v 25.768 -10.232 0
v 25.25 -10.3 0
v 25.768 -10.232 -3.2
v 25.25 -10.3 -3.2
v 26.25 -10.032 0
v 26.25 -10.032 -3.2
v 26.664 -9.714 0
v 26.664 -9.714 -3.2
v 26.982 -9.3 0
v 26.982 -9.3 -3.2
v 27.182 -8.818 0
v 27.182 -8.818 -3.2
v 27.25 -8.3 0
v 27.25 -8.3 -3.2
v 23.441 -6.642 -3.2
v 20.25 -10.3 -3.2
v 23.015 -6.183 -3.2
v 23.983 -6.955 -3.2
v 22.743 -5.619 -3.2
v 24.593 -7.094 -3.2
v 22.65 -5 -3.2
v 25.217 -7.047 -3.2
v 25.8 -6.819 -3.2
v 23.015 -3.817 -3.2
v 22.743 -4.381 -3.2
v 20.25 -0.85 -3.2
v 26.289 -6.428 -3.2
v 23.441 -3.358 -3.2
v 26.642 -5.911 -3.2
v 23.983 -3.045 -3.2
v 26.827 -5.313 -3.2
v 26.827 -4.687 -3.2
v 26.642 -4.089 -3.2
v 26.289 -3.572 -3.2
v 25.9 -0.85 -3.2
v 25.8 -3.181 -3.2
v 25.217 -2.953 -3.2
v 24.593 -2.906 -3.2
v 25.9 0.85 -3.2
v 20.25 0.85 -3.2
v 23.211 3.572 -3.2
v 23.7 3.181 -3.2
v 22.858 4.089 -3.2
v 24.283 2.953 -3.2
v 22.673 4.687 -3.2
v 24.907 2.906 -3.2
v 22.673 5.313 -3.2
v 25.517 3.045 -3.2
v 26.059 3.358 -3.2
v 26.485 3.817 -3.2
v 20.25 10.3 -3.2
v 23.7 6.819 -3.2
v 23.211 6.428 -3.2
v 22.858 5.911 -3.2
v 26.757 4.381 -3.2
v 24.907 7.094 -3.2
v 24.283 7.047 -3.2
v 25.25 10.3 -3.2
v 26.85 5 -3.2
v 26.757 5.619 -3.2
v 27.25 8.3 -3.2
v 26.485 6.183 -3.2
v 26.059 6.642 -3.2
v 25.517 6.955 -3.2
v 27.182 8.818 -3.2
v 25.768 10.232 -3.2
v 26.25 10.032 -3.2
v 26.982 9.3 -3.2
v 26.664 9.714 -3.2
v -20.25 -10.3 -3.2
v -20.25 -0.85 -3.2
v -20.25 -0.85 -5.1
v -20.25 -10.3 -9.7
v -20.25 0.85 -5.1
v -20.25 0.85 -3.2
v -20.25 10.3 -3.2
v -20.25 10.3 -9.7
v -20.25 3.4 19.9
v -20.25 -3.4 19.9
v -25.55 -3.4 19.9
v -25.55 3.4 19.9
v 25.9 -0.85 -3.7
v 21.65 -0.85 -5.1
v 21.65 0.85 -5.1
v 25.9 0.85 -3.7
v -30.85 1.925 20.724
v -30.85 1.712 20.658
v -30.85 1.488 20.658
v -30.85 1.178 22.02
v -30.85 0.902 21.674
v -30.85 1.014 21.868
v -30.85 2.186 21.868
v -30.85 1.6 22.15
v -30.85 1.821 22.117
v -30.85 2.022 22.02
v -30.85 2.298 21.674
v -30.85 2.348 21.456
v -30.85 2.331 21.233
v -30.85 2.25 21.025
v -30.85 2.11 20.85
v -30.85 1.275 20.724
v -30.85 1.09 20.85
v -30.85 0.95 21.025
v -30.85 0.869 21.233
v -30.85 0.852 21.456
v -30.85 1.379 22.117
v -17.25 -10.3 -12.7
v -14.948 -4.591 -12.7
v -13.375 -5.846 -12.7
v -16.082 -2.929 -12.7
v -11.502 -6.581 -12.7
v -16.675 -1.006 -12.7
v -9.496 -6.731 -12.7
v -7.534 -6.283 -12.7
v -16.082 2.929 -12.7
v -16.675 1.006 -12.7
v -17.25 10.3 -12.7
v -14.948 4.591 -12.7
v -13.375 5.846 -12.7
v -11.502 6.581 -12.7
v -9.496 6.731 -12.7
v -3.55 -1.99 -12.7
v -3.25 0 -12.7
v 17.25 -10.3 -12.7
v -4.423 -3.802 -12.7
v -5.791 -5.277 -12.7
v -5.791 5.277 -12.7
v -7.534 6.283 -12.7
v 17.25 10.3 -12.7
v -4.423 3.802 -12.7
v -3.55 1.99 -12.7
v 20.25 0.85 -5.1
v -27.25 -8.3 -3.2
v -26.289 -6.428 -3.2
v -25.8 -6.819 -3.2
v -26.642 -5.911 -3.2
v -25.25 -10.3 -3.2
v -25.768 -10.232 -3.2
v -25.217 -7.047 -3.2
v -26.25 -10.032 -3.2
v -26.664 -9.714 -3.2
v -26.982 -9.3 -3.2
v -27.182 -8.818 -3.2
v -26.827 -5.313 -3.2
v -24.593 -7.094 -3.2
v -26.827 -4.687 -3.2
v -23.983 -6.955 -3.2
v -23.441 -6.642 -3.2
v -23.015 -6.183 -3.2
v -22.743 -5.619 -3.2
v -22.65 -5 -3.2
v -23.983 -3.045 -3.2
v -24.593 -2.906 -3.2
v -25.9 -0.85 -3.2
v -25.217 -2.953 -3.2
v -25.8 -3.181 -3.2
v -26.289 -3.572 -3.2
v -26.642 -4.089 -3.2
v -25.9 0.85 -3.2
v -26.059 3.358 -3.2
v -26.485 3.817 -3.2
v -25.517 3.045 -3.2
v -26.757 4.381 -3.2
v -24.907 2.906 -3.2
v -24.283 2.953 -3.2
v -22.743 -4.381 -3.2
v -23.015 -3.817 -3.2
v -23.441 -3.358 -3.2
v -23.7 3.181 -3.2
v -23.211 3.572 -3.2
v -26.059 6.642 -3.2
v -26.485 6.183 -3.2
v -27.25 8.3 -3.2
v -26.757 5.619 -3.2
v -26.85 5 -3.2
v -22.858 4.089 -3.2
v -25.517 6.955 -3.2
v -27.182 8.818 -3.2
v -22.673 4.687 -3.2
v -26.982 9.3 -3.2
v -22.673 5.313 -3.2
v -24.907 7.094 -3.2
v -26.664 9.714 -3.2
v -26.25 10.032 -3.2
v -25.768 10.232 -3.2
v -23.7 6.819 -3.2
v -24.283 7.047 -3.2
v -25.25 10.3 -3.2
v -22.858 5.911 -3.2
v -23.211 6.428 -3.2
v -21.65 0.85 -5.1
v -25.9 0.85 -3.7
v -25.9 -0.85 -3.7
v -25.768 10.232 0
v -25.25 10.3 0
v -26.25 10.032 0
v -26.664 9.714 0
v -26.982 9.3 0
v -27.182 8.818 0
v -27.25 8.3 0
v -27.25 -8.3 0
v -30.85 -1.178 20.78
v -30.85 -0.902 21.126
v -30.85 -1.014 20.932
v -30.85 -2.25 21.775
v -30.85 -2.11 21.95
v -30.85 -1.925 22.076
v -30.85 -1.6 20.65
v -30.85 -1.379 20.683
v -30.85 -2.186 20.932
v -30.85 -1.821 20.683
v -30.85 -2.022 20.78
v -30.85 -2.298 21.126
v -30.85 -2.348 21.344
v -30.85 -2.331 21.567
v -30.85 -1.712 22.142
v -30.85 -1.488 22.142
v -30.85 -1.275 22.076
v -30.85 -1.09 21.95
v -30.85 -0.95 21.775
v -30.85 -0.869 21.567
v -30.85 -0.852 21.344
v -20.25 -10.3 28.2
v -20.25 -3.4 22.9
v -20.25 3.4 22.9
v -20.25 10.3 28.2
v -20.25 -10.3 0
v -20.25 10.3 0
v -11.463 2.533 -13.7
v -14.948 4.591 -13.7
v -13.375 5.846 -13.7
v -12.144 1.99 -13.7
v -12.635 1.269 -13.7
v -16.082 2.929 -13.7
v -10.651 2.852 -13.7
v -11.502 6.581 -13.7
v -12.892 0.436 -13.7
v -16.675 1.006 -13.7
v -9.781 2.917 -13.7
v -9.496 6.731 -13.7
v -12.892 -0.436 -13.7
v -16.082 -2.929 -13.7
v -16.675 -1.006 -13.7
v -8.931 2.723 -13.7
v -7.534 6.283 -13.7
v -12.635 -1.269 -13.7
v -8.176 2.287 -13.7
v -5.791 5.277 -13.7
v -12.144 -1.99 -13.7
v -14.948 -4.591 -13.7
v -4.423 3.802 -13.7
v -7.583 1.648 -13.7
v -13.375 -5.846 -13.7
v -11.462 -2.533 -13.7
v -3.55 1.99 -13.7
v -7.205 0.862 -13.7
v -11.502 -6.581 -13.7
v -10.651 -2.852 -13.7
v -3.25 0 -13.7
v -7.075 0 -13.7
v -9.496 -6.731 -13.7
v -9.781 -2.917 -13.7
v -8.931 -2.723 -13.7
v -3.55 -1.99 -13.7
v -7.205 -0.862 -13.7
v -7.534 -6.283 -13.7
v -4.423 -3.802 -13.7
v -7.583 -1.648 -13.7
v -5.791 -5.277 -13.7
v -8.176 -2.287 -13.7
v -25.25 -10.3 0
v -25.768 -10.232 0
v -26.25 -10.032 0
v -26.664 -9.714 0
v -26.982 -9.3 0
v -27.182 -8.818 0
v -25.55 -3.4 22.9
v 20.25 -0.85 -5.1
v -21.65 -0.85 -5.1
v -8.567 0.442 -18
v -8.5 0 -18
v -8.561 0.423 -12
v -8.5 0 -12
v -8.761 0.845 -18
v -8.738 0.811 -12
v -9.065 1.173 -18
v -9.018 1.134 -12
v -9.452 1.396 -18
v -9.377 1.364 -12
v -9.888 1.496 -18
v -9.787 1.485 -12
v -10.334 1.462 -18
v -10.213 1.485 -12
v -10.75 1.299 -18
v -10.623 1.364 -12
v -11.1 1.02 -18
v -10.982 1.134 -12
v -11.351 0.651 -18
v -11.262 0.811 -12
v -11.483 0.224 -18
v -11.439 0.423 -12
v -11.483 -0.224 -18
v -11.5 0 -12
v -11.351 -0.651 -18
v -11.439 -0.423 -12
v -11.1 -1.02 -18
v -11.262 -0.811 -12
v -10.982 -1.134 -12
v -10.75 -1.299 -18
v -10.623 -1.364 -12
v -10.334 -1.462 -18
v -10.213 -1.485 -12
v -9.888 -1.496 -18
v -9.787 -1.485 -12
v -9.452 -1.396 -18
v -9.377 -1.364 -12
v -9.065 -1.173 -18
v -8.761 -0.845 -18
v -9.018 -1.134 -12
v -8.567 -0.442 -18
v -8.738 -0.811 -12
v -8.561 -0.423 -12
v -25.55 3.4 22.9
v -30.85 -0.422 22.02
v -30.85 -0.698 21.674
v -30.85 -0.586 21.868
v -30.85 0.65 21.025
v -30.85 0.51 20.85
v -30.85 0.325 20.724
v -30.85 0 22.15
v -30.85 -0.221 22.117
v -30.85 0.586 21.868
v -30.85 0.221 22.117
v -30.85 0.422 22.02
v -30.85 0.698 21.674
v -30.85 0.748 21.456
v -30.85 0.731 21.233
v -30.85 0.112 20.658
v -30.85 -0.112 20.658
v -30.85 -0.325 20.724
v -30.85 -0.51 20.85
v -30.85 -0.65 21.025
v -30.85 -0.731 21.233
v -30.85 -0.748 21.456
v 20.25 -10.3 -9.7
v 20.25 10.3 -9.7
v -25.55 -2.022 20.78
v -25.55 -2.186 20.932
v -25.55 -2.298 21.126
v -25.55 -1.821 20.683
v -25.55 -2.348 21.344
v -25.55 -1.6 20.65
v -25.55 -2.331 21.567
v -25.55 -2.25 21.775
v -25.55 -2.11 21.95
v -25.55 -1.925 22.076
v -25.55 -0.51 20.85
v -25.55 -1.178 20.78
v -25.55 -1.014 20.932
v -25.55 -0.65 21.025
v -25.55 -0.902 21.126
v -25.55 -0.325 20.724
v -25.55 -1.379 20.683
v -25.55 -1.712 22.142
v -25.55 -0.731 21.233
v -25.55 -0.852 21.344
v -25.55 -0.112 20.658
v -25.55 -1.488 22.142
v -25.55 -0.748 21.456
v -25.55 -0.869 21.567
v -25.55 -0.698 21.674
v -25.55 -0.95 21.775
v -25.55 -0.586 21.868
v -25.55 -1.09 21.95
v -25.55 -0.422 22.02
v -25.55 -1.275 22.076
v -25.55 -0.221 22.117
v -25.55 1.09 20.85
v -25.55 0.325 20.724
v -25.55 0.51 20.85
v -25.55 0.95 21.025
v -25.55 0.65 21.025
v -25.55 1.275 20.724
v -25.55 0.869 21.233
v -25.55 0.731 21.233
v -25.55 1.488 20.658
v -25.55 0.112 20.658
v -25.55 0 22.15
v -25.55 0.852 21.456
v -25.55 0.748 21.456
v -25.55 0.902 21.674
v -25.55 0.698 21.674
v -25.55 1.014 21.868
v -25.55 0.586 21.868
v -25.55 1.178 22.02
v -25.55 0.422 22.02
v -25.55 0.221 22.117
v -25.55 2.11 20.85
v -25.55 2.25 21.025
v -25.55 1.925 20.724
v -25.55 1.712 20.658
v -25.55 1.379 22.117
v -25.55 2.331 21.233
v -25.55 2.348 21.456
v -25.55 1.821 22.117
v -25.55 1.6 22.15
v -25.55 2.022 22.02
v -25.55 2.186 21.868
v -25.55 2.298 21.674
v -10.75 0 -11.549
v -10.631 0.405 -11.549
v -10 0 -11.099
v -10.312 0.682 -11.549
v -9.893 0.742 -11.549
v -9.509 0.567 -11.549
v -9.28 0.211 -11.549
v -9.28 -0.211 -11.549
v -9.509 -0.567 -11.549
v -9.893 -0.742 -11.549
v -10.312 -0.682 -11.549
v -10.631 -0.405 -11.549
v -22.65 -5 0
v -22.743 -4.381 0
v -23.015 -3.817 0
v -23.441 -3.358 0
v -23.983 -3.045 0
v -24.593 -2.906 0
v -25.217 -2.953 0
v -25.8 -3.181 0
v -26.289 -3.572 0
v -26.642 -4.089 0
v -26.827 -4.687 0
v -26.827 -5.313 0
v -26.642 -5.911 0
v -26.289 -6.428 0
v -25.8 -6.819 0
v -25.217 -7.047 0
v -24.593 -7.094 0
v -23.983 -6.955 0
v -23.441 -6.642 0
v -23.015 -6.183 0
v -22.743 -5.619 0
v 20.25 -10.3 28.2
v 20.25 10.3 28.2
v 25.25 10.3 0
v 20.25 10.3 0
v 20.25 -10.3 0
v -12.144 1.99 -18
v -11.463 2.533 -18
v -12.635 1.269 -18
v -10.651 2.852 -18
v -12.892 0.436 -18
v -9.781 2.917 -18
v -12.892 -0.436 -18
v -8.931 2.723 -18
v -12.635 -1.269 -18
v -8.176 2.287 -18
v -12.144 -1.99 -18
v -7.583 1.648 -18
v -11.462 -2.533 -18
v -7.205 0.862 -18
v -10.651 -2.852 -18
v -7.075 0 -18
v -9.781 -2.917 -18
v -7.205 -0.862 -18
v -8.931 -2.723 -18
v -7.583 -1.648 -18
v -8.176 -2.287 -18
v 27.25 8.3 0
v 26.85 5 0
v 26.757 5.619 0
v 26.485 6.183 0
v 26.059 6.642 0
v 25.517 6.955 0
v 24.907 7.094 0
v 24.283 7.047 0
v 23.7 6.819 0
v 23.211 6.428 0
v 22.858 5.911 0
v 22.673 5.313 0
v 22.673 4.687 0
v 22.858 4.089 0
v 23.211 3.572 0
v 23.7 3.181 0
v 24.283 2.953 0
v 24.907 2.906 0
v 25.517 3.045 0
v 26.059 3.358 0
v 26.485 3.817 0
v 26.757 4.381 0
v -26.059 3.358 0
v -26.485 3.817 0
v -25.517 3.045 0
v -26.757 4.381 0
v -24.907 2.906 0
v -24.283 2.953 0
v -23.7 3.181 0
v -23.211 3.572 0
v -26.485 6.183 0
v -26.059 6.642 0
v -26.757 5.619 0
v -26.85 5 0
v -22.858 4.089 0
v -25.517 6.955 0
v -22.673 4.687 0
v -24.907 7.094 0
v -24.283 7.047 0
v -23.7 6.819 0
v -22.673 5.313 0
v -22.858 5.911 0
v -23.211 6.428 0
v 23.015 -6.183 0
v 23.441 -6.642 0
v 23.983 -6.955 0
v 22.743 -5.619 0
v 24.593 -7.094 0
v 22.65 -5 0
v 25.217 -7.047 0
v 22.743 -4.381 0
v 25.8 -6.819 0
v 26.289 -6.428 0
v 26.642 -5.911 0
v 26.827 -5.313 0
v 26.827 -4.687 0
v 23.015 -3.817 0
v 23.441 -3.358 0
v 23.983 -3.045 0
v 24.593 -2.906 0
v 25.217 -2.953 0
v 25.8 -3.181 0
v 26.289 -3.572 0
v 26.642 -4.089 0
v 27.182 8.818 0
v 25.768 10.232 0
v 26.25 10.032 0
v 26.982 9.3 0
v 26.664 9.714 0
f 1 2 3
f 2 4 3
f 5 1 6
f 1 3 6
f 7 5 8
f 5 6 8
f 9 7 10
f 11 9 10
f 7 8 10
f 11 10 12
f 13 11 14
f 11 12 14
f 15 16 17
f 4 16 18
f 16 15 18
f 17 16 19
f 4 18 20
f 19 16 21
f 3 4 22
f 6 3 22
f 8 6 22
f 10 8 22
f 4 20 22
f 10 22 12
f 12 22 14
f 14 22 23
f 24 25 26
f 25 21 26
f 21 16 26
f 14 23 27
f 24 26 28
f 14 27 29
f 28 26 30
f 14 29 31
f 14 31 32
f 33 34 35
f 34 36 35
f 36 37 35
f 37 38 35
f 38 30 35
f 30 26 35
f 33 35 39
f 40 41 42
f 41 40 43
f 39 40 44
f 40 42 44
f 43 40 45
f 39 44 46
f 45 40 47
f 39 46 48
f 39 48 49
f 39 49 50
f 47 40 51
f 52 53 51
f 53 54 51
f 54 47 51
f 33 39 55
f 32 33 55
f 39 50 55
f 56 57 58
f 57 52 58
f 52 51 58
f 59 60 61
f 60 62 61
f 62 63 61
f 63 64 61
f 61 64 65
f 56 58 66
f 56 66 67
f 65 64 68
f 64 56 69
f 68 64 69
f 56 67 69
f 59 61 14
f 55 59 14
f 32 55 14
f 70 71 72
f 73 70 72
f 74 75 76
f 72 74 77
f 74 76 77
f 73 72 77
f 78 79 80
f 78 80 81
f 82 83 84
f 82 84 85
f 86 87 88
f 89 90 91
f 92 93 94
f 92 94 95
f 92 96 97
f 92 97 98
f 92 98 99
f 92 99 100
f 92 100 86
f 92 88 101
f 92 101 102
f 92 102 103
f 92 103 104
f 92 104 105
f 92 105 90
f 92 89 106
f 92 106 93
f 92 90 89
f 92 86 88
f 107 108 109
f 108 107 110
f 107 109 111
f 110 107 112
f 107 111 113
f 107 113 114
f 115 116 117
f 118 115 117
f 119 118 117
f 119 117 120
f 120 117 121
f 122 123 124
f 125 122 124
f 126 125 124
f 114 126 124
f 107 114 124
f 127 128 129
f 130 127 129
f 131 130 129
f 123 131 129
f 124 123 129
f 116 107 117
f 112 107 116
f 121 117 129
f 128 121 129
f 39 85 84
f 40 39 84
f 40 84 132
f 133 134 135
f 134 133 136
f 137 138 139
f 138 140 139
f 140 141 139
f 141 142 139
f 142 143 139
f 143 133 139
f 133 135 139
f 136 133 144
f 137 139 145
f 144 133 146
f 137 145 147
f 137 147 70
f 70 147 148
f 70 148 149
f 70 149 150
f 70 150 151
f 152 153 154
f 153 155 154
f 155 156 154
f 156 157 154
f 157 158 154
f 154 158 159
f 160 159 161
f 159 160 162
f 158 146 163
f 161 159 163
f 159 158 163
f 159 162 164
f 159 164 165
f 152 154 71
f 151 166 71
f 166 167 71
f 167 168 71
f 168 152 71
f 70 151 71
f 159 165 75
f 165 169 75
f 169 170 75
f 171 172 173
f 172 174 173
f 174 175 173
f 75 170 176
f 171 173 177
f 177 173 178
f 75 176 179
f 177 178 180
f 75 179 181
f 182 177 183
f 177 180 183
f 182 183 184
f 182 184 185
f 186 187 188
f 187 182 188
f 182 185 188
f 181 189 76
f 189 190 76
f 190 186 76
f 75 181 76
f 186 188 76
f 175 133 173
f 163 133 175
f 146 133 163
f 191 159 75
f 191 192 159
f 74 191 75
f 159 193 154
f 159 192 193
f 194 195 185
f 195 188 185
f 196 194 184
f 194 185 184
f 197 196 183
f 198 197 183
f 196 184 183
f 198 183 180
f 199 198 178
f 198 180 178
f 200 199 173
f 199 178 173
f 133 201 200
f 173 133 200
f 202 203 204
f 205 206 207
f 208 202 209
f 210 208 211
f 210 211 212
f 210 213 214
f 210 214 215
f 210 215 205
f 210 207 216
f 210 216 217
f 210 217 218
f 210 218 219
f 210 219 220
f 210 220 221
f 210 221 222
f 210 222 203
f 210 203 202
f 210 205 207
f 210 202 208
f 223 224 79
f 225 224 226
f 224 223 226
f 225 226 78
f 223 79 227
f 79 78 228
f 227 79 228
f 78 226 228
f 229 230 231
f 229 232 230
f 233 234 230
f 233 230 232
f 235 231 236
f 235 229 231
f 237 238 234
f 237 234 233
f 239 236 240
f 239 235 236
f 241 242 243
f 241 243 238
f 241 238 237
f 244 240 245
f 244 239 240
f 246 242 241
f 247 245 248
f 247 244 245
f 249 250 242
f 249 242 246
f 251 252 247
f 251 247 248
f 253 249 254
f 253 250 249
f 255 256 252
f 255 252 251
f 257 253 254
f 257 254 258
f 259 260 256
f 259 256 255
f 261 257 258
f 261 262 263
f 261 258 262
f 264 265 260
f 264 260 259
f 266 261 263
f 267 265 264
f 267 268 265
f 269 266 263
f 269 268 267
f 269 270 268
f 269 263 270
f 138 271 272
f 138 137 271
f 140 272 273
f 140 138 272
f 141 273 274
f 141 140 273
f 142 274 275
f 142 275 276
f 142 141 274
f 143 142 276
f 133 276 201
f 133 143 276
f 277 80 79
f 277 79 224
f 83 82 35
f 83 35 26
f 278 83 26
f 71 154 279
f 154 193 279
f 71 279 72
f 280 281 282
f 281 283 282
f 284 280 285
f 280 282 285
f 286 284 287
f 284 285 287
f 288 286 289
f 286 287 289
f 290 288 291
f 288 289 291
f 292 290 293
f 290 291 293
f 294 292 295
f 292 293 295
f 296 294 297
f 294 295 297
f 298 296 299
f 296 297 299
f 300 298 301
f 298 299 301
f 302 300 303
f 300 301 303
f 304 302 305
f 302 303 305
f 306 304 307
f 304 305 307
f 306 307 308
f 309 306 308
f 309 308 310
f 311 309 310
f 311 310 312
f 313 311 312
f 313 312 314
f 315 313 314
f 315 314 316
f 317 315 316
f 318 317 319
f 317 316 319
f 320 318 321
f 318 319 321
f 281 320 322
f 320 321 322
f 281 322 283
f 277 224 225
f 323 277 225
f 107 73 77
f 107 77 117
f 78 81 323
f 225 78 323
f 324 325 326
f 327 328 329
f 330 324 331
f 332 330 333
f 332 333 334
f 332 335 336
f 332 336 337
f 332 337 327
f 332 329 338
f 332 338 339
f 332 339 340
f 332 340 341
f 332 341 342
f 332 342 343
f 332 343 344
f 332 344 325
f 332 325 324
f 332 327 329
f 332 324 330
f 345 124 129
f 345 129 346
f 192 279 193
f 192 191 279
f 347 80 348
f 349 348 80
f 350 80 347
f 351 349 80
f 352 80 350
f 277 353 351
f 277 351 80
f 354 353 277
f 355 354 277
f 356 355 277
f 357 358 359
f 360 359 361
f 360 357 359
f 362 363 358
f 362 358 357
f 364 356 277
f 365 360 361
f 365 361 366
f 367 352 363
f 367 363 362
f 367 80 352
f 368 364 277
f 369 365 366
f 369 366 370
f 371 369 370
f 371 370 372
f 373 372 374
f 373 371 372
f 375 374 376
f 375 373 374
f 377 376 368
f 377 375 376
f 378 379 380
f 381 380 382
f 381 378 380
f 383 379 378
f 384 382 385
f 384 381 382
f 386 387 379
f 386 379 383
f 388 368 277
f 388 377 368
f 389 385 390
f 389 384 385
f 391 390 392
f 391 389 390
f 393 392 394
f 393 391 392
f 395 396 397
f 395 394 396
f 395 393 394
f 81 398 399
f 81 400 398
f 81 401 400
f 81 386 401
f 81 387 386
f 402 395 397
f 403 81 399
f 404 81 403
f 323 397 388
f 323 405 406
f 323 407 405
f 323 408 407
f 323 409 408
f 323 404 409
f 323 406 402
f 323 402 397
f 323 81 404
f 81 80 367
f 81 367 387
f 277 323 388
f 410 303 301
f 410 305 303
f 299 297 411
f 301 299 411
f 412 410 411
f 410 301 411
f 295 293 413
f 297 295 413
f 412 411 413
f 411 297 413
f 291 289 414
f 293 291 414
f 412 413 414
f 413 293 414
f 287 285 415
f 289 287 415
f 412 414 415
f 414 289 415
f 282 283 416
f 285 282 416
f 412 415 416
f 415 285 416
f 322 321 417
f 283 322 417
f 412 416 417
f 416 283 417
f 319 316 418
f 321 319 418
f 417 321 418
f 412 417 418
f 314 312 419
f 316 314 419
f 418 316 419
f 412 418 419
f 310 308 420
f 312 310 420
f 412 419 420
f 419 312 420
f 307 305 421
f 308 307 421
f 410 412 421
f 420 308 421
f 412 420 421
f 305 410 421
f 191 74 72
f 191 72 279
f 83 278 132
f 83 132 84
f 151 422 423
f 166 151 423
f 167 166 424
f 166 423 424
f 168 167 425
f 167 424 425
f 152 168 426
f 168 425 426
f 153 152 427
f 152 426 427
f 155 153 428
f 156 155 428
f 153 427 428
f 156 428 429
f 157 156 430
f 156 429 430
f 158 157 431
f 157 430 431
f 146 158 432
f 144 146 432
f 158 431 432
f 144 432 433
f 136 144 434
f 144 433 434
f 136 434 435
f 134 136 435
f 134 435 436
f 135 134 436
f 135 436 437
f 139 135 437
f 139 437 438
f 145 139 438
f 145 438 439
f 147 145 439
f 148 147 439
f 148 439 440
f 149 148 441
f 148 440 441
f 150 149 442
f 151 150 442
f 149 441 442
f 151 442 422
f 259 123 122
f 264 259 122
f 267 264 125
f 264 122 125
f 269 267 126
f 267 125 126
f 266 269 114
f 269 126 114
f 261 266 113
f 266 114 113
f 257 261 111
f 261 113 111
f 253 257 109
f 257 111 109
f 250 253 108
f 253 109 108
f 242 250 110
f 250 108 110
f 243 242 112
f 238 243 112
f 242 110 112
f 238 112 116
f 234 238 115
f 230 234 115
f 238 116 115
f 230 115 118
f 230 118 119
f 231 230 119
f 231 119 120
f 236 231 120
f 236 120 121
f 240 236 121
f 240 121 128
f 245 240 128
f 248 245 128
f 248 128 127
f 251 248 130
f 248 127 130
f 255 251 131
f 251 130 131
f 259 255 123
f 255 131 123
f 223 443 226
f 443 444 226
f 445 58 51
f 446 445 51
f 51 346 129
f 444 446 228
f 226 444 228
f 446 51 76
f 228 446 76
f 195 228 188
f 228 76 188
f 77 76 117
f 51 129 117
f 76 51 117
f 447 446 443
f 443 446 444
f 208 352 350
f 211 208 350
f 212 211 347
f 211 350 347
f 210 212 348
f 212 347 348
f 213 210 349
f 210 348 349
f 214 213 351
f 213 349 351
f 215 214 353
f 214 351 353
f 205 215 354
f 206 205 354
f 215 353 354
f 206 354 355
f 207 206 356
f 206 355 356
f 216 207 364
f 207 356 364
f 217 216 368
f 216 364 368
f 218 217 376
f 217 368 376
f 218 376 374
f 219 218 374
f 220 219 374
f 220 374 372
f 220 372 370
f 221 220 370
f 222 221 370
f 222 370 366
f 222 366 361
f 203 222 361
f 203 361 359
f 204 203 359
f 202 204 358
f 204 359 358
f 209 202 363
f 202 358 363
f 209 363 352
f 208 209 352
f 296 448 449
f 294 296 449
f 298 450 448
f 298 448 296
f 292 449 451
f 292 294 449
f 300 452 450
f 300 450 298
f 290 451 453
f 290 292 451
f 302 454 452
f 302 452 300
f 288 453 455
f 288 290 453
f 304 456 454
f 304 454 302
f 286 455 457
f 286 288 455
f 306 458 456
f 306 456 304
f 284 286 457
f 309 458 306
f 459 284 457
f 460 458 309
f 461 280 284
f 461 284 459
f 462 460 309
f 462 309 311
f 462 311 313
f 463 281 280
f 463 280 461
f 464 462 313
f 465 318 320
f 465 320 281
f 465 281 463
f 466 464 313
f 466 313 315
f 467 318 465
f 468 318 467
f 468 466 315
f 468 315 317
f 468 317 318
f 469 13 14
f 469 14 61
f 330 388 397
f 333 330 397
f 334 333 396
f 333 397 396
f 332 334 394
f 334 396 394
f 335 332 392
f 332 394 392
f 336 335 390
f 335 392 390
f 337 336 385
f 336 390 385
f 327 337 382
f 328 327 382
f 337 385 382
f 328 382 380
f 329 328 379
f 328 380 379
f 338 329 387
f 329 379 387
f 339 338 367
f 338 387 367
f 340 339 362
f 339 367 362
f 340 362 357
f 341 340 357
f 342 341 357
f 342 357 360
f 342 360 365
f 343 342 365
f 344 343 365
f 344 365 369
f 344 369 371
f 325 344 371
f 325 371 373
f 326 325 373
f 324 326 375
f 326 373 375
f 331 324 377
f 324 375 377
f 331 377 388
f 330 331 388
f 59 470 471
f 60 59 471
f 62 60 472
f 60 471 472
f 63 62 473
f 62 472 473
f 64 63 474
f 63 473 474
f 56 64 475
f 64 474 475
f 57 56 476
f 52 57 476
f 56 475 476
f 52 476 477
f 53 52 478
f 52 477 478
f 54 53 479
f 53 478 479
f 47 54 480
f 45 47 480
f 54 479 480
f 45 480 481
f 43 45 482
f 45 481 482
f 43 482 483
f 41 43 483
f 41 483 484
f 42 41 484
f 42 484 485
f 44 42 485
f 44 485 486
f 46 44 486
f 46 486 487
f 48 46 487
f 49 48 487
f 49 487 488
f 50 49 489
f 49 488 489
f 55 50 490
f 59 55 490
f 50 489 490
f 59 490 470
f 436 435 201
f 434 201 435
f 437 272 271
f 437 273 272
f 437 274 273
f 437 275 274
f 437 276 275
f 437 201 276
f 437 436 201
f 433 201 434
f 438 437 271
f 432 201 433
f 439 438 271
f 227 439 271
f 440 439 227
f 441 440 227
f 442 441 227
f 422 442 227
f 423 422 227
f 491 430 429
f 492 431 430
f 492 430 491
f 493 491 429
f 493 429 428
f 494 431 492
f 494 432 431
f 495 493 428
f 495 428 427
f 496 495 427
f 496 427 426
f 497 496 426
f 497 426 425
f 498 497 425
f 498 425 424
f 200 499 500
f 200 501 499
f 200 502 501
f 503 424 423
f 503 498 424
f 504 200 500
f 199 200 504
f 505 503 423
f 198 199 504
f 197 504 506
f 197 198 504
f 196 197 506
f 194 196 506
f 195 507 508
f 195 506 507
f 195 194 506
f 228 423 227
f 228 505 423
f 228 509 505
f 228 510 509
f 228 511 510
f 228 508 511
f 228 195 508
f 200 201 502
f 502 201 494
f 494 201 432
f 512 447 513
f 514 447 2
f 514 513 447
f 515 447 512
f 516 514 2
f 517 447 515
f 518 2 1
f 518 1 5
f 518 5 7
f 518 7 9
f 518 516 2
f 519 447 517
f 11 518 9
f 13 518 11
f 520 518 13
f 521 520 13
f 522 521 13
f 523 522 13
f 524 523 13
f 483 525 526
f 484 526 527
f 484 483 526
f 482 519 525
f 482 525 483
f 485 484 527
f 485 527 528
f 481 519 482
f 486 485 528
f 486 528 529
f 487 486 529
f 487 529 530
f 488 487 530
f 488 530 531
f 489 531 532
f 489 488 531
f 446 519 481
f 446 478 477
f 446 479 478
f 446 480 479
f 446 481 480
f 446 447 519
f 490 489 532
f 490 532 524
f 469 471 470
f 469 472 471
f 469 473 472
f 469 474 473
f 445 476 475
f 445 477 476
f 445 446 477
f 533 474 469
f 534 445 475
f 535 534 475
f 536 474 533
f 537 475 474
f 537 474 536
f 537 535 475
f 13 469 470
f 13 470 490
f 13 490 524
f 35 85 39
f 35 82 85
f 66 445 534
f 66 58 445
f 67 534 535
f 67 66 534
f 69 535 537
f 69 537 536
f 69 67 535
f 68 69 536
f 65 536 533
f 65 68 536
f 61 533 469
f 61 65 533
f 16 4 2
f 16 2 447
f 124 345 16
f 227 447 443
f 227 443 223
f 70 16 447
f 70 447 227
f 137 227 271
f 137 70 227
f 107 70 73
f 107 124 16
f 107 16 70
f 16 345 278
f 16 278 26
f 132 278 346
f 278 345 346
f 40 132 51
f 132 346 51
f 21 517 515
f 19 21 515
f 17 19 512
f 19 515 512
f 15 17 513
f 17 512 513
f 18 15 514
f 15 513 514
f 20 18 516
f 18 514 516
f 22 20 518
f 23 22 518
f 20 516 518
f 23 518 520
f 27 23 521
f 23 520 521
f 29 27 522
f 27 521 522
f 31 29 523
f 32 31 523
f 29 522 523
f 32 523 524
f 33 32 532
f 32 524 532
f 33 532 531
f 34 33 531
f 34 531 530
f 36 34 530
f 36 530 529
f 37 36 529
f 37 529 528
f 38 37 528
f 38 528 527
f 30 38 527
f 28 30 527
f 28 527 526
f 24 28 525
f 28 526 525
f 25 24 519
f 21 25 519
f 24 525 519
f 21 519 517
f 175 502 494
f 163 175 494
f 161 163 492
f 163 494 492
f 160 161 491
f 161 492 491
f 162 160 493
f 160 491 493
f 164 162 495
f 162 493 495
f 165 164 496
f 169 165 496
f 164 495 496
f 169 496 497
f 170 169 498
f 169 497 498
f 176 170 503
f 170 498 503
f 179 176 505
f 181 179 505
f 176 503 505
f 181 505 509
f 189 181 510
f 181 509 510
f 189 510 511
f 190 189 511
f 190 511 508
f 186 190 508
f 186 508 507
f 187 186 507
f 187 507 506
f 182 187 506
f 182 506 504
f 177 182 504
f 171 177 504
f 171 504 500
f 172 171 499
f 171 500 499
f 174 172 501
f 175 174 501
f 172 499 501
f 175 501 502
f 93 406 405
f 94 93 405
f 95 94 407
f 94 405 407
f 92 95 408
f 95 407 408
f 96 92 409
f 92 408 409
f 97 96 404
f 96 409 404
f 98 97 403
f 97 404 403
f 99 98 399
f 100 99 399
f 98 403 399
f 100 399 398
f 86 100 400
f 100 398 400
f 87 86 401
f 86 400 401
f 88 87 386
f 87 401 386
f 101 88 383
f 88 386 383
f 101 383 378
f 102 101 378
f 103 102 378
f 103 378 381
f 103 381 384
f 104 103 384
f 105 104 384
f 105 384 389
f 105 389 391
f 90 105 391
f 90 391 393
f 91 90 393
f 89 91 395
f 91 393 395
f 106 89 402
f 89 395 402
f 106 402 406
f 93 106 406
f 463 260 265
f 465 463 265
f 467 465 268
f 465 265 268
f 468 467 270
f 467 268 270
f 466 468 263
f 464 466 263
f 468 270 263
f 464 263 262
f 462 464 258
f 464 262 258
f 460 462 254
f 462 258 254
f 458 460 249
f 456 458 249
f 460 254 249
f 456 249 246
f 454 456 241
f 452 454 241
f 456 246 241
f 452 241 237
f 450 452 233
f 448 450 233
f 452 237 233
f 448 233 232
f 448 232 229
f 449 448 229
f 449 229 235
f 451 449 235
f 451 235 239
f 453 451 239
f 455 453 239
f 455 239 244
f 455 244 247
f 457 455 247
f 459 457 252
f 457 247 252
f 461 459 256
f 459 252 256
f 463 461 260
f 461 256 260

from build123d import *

# Parameters (mm, degrees)
BOSS_EXTRU_1_DEPTH                = 10.3
ESQUISSE3_W                       = 7
ESQUISSE3_H                       = 20.6
ESQUISSE3_R                       = 2.1
BOSS_EXTRU_2_DEPTH                = 3.2
BOSS_EXTRU_3_DEPTH                = 0.85
ESQUISSE8_R                       = 6.75
BOSS_EXTRU_7_DEPTH                = 1
ESQUISSE5_R                       = 2.925
BOSS_EXTRU_4_DEPTH                = 4.3
CONG_1_R                          = 2
ESQUISSE6_W                       = 3
ESQUISSE6_H                       = 6.8
BOSS_EXTRU_5_DEPTH                = 5.3
ESQUISSE7_R                       = 0.75
BOSS_EXTRU_6_DEPTH                = 5.3
DIAM_TRE_DU_PER_AGE_3_0_3_1_D     = 3
DIAM_TRE_DU_PER_AGE_3_0_3_1_DEPTH = 6
DIAM_TRE_DU_PER_AGE_3_0_3_1_TIP   = 0.901290929


with BuildPart() as part:
    # Esquisse1 → Boss.-Extru.1 (new, symmetric)
    with BuildSketch(Plane(origin=(0, 0, 0), x_dir=(1, 0, 0), z_dir=(0, 1, 0))):
        Polygon((-17.25, 12.7), (17.25, 12.7), (20.25, 9.7), (20.25, -28.2), (-20.25, -28.2), (-20.25, 9.7), align=None)
    extrude(amount=BOSS_EXTRU_1_DEPTH, both=True)

    # Esquisse3 → Boss.-Extru.2 (add)
    # profile 1 of 2: a face of its own
    with BuildSketch(Plane.XY):
        with Locations((23.75, 0)):
            Rectangle(ESQUISSE3_W, ESQUISSE3_H)
        with Locations((24.75, 5)):
            Circle(ESQUISSE3_R, mode=Mode.SUBTRACT)
        with Locations(Location((24.75, -5, 0), (0, 0, 180))):
            Circle(ESQUISSE3_R, mode=Mode.SUBTRACT)
    # profile 2 of 2: a face of its own
    with BuildSketch(Plane.XY):
        with Locations((-23.75, 0)):
            Rectangle(ESQUISSE3_W, ESQUISSE3_H)
        with Locations(Location((-24.75, 5, 0), (0, 0, 180))):
            Circle(ESQUISSE3_R, mode=Mode.SUBTRACT)
        with Locations((-24.75, -5)):
            Circle(ESQUISSE3_R, mode=Mode.SUBTRACT)
    extrude(amount=-BOSS_EXTRU_2_DEPTH)

    # Esquisse4 → Boss.-Extru.3 (add, symmetric)
    with BuildSketch(Plane(origin=(0, 0, 0), x_dir=(1, 0, 0), z_dir=(0, 1, 0))):
        Polygon((20.25, 3.2), (20.25, 5.1), (21.65, 5.1), (25.9, 3.7), (25.9, 3.2), align=None)
        Polygon((-25.9, 3.2), (-20.25, 3.2), (-20.25, 5.1), (-21.65, 5.1), (-25.9, 3.7), align=None)
    extrude(amount=BOSS_EXTRU_3_DEPTH, both=True)

    # Esquisse8 → Boss.-Extru.7 (add)
    with BuildSketch(Plane(origin=(0, 0, -12.7), x_dir=(-1, 0, 0), z_dir=(0, 0, -1))):
        with Locations(Location((10, 0, 0), (0, 0, 180))):
            Circle(ESQUISSE8_R)
    extrude(amount=BOSS_EXTRU_7_DEPTH)

    # Esquisse5 → Boss.-Extru.4 (add)
    with BuildSketch(Plane(origin=(0, 0, -13.7), x_dir=(-1, 0, 0), z_dir=(0, 0, -1))):
        with Locations(Location((10, 0, 0), (0, 0, 180))):
            Circle(ESQUISSE5_R)
    extrude(amount=BOSS_EXTRU_4_DEPTH)

    # Congé1
    cong_1_edges = [part.edges().sort_by_distance(p)[0] for p in [
        (27.25, 10.3, -1.6),
        (27.25, -10.3, -1.6),
        (-27.25, -10.3, -1.6),
        (-27.25, 10.3, -1.6),
    ]]
    fillet(cong_1_edges, radius=CONG_1_R)

    # Esquisse6 → Boss.-Extru.5 (add)
    with BuildSketch(Plane.ZY.offset(20.25)):
        with Locations((21.4, 0)):
            Rectangle(ESQUISSE6_W, ESQUISSE6_H)
    extrude(amount=BOSS_EXTRU_5_DEPTH)

    # Esquisse7 → Boss.-Extru.6 (add)
    with BuildSketch(Plane.ZY.offset(25.55)):
        with Locations((21.4, 0)):
            Circle(ESQUISSE7_R)
        with Locations((21.4, 1.6)):
            Circle(ESQUISSE7_R)
        with Locations(Location((21.4, -1.6, 0), (0, 0, 180))):
            Circle(ESQUISSE7_R)
    extrude(amount=BOSS_EXTRU_6_DEPTH)

    # Diamètre du perçage Ø3.0 (3)1
    with Locations(Plane(origin=(0, 0, -18), x_dir=(-1, 0, 0), z_dir=(0, 0, -1))):
        with Locations((10, 0)):
            Hole(DIAM_TRE_DU_PER_AGE_3_0_3_1_D / 2, depth=DIAM_TRE_DU_PER_AGE_3_0_3_1_DEPTH)
            with Locations((0, 0, -(DIAM_TRE_DU_PER_AGE_3_0_3_1_DEPTH + DIAM_TRE_DU_PER_AGE_3_0_3_1_TIP / 2))):  # 118° drill point
                Cone(0, DIAM_TRE_DU_PER_AGE_3_0_3_1_D / 2, DIAM_TRE_DU_PER_AGE_3_0_3_1_TIP, mode=Mode.SUBTRACT)


solid = part.part
